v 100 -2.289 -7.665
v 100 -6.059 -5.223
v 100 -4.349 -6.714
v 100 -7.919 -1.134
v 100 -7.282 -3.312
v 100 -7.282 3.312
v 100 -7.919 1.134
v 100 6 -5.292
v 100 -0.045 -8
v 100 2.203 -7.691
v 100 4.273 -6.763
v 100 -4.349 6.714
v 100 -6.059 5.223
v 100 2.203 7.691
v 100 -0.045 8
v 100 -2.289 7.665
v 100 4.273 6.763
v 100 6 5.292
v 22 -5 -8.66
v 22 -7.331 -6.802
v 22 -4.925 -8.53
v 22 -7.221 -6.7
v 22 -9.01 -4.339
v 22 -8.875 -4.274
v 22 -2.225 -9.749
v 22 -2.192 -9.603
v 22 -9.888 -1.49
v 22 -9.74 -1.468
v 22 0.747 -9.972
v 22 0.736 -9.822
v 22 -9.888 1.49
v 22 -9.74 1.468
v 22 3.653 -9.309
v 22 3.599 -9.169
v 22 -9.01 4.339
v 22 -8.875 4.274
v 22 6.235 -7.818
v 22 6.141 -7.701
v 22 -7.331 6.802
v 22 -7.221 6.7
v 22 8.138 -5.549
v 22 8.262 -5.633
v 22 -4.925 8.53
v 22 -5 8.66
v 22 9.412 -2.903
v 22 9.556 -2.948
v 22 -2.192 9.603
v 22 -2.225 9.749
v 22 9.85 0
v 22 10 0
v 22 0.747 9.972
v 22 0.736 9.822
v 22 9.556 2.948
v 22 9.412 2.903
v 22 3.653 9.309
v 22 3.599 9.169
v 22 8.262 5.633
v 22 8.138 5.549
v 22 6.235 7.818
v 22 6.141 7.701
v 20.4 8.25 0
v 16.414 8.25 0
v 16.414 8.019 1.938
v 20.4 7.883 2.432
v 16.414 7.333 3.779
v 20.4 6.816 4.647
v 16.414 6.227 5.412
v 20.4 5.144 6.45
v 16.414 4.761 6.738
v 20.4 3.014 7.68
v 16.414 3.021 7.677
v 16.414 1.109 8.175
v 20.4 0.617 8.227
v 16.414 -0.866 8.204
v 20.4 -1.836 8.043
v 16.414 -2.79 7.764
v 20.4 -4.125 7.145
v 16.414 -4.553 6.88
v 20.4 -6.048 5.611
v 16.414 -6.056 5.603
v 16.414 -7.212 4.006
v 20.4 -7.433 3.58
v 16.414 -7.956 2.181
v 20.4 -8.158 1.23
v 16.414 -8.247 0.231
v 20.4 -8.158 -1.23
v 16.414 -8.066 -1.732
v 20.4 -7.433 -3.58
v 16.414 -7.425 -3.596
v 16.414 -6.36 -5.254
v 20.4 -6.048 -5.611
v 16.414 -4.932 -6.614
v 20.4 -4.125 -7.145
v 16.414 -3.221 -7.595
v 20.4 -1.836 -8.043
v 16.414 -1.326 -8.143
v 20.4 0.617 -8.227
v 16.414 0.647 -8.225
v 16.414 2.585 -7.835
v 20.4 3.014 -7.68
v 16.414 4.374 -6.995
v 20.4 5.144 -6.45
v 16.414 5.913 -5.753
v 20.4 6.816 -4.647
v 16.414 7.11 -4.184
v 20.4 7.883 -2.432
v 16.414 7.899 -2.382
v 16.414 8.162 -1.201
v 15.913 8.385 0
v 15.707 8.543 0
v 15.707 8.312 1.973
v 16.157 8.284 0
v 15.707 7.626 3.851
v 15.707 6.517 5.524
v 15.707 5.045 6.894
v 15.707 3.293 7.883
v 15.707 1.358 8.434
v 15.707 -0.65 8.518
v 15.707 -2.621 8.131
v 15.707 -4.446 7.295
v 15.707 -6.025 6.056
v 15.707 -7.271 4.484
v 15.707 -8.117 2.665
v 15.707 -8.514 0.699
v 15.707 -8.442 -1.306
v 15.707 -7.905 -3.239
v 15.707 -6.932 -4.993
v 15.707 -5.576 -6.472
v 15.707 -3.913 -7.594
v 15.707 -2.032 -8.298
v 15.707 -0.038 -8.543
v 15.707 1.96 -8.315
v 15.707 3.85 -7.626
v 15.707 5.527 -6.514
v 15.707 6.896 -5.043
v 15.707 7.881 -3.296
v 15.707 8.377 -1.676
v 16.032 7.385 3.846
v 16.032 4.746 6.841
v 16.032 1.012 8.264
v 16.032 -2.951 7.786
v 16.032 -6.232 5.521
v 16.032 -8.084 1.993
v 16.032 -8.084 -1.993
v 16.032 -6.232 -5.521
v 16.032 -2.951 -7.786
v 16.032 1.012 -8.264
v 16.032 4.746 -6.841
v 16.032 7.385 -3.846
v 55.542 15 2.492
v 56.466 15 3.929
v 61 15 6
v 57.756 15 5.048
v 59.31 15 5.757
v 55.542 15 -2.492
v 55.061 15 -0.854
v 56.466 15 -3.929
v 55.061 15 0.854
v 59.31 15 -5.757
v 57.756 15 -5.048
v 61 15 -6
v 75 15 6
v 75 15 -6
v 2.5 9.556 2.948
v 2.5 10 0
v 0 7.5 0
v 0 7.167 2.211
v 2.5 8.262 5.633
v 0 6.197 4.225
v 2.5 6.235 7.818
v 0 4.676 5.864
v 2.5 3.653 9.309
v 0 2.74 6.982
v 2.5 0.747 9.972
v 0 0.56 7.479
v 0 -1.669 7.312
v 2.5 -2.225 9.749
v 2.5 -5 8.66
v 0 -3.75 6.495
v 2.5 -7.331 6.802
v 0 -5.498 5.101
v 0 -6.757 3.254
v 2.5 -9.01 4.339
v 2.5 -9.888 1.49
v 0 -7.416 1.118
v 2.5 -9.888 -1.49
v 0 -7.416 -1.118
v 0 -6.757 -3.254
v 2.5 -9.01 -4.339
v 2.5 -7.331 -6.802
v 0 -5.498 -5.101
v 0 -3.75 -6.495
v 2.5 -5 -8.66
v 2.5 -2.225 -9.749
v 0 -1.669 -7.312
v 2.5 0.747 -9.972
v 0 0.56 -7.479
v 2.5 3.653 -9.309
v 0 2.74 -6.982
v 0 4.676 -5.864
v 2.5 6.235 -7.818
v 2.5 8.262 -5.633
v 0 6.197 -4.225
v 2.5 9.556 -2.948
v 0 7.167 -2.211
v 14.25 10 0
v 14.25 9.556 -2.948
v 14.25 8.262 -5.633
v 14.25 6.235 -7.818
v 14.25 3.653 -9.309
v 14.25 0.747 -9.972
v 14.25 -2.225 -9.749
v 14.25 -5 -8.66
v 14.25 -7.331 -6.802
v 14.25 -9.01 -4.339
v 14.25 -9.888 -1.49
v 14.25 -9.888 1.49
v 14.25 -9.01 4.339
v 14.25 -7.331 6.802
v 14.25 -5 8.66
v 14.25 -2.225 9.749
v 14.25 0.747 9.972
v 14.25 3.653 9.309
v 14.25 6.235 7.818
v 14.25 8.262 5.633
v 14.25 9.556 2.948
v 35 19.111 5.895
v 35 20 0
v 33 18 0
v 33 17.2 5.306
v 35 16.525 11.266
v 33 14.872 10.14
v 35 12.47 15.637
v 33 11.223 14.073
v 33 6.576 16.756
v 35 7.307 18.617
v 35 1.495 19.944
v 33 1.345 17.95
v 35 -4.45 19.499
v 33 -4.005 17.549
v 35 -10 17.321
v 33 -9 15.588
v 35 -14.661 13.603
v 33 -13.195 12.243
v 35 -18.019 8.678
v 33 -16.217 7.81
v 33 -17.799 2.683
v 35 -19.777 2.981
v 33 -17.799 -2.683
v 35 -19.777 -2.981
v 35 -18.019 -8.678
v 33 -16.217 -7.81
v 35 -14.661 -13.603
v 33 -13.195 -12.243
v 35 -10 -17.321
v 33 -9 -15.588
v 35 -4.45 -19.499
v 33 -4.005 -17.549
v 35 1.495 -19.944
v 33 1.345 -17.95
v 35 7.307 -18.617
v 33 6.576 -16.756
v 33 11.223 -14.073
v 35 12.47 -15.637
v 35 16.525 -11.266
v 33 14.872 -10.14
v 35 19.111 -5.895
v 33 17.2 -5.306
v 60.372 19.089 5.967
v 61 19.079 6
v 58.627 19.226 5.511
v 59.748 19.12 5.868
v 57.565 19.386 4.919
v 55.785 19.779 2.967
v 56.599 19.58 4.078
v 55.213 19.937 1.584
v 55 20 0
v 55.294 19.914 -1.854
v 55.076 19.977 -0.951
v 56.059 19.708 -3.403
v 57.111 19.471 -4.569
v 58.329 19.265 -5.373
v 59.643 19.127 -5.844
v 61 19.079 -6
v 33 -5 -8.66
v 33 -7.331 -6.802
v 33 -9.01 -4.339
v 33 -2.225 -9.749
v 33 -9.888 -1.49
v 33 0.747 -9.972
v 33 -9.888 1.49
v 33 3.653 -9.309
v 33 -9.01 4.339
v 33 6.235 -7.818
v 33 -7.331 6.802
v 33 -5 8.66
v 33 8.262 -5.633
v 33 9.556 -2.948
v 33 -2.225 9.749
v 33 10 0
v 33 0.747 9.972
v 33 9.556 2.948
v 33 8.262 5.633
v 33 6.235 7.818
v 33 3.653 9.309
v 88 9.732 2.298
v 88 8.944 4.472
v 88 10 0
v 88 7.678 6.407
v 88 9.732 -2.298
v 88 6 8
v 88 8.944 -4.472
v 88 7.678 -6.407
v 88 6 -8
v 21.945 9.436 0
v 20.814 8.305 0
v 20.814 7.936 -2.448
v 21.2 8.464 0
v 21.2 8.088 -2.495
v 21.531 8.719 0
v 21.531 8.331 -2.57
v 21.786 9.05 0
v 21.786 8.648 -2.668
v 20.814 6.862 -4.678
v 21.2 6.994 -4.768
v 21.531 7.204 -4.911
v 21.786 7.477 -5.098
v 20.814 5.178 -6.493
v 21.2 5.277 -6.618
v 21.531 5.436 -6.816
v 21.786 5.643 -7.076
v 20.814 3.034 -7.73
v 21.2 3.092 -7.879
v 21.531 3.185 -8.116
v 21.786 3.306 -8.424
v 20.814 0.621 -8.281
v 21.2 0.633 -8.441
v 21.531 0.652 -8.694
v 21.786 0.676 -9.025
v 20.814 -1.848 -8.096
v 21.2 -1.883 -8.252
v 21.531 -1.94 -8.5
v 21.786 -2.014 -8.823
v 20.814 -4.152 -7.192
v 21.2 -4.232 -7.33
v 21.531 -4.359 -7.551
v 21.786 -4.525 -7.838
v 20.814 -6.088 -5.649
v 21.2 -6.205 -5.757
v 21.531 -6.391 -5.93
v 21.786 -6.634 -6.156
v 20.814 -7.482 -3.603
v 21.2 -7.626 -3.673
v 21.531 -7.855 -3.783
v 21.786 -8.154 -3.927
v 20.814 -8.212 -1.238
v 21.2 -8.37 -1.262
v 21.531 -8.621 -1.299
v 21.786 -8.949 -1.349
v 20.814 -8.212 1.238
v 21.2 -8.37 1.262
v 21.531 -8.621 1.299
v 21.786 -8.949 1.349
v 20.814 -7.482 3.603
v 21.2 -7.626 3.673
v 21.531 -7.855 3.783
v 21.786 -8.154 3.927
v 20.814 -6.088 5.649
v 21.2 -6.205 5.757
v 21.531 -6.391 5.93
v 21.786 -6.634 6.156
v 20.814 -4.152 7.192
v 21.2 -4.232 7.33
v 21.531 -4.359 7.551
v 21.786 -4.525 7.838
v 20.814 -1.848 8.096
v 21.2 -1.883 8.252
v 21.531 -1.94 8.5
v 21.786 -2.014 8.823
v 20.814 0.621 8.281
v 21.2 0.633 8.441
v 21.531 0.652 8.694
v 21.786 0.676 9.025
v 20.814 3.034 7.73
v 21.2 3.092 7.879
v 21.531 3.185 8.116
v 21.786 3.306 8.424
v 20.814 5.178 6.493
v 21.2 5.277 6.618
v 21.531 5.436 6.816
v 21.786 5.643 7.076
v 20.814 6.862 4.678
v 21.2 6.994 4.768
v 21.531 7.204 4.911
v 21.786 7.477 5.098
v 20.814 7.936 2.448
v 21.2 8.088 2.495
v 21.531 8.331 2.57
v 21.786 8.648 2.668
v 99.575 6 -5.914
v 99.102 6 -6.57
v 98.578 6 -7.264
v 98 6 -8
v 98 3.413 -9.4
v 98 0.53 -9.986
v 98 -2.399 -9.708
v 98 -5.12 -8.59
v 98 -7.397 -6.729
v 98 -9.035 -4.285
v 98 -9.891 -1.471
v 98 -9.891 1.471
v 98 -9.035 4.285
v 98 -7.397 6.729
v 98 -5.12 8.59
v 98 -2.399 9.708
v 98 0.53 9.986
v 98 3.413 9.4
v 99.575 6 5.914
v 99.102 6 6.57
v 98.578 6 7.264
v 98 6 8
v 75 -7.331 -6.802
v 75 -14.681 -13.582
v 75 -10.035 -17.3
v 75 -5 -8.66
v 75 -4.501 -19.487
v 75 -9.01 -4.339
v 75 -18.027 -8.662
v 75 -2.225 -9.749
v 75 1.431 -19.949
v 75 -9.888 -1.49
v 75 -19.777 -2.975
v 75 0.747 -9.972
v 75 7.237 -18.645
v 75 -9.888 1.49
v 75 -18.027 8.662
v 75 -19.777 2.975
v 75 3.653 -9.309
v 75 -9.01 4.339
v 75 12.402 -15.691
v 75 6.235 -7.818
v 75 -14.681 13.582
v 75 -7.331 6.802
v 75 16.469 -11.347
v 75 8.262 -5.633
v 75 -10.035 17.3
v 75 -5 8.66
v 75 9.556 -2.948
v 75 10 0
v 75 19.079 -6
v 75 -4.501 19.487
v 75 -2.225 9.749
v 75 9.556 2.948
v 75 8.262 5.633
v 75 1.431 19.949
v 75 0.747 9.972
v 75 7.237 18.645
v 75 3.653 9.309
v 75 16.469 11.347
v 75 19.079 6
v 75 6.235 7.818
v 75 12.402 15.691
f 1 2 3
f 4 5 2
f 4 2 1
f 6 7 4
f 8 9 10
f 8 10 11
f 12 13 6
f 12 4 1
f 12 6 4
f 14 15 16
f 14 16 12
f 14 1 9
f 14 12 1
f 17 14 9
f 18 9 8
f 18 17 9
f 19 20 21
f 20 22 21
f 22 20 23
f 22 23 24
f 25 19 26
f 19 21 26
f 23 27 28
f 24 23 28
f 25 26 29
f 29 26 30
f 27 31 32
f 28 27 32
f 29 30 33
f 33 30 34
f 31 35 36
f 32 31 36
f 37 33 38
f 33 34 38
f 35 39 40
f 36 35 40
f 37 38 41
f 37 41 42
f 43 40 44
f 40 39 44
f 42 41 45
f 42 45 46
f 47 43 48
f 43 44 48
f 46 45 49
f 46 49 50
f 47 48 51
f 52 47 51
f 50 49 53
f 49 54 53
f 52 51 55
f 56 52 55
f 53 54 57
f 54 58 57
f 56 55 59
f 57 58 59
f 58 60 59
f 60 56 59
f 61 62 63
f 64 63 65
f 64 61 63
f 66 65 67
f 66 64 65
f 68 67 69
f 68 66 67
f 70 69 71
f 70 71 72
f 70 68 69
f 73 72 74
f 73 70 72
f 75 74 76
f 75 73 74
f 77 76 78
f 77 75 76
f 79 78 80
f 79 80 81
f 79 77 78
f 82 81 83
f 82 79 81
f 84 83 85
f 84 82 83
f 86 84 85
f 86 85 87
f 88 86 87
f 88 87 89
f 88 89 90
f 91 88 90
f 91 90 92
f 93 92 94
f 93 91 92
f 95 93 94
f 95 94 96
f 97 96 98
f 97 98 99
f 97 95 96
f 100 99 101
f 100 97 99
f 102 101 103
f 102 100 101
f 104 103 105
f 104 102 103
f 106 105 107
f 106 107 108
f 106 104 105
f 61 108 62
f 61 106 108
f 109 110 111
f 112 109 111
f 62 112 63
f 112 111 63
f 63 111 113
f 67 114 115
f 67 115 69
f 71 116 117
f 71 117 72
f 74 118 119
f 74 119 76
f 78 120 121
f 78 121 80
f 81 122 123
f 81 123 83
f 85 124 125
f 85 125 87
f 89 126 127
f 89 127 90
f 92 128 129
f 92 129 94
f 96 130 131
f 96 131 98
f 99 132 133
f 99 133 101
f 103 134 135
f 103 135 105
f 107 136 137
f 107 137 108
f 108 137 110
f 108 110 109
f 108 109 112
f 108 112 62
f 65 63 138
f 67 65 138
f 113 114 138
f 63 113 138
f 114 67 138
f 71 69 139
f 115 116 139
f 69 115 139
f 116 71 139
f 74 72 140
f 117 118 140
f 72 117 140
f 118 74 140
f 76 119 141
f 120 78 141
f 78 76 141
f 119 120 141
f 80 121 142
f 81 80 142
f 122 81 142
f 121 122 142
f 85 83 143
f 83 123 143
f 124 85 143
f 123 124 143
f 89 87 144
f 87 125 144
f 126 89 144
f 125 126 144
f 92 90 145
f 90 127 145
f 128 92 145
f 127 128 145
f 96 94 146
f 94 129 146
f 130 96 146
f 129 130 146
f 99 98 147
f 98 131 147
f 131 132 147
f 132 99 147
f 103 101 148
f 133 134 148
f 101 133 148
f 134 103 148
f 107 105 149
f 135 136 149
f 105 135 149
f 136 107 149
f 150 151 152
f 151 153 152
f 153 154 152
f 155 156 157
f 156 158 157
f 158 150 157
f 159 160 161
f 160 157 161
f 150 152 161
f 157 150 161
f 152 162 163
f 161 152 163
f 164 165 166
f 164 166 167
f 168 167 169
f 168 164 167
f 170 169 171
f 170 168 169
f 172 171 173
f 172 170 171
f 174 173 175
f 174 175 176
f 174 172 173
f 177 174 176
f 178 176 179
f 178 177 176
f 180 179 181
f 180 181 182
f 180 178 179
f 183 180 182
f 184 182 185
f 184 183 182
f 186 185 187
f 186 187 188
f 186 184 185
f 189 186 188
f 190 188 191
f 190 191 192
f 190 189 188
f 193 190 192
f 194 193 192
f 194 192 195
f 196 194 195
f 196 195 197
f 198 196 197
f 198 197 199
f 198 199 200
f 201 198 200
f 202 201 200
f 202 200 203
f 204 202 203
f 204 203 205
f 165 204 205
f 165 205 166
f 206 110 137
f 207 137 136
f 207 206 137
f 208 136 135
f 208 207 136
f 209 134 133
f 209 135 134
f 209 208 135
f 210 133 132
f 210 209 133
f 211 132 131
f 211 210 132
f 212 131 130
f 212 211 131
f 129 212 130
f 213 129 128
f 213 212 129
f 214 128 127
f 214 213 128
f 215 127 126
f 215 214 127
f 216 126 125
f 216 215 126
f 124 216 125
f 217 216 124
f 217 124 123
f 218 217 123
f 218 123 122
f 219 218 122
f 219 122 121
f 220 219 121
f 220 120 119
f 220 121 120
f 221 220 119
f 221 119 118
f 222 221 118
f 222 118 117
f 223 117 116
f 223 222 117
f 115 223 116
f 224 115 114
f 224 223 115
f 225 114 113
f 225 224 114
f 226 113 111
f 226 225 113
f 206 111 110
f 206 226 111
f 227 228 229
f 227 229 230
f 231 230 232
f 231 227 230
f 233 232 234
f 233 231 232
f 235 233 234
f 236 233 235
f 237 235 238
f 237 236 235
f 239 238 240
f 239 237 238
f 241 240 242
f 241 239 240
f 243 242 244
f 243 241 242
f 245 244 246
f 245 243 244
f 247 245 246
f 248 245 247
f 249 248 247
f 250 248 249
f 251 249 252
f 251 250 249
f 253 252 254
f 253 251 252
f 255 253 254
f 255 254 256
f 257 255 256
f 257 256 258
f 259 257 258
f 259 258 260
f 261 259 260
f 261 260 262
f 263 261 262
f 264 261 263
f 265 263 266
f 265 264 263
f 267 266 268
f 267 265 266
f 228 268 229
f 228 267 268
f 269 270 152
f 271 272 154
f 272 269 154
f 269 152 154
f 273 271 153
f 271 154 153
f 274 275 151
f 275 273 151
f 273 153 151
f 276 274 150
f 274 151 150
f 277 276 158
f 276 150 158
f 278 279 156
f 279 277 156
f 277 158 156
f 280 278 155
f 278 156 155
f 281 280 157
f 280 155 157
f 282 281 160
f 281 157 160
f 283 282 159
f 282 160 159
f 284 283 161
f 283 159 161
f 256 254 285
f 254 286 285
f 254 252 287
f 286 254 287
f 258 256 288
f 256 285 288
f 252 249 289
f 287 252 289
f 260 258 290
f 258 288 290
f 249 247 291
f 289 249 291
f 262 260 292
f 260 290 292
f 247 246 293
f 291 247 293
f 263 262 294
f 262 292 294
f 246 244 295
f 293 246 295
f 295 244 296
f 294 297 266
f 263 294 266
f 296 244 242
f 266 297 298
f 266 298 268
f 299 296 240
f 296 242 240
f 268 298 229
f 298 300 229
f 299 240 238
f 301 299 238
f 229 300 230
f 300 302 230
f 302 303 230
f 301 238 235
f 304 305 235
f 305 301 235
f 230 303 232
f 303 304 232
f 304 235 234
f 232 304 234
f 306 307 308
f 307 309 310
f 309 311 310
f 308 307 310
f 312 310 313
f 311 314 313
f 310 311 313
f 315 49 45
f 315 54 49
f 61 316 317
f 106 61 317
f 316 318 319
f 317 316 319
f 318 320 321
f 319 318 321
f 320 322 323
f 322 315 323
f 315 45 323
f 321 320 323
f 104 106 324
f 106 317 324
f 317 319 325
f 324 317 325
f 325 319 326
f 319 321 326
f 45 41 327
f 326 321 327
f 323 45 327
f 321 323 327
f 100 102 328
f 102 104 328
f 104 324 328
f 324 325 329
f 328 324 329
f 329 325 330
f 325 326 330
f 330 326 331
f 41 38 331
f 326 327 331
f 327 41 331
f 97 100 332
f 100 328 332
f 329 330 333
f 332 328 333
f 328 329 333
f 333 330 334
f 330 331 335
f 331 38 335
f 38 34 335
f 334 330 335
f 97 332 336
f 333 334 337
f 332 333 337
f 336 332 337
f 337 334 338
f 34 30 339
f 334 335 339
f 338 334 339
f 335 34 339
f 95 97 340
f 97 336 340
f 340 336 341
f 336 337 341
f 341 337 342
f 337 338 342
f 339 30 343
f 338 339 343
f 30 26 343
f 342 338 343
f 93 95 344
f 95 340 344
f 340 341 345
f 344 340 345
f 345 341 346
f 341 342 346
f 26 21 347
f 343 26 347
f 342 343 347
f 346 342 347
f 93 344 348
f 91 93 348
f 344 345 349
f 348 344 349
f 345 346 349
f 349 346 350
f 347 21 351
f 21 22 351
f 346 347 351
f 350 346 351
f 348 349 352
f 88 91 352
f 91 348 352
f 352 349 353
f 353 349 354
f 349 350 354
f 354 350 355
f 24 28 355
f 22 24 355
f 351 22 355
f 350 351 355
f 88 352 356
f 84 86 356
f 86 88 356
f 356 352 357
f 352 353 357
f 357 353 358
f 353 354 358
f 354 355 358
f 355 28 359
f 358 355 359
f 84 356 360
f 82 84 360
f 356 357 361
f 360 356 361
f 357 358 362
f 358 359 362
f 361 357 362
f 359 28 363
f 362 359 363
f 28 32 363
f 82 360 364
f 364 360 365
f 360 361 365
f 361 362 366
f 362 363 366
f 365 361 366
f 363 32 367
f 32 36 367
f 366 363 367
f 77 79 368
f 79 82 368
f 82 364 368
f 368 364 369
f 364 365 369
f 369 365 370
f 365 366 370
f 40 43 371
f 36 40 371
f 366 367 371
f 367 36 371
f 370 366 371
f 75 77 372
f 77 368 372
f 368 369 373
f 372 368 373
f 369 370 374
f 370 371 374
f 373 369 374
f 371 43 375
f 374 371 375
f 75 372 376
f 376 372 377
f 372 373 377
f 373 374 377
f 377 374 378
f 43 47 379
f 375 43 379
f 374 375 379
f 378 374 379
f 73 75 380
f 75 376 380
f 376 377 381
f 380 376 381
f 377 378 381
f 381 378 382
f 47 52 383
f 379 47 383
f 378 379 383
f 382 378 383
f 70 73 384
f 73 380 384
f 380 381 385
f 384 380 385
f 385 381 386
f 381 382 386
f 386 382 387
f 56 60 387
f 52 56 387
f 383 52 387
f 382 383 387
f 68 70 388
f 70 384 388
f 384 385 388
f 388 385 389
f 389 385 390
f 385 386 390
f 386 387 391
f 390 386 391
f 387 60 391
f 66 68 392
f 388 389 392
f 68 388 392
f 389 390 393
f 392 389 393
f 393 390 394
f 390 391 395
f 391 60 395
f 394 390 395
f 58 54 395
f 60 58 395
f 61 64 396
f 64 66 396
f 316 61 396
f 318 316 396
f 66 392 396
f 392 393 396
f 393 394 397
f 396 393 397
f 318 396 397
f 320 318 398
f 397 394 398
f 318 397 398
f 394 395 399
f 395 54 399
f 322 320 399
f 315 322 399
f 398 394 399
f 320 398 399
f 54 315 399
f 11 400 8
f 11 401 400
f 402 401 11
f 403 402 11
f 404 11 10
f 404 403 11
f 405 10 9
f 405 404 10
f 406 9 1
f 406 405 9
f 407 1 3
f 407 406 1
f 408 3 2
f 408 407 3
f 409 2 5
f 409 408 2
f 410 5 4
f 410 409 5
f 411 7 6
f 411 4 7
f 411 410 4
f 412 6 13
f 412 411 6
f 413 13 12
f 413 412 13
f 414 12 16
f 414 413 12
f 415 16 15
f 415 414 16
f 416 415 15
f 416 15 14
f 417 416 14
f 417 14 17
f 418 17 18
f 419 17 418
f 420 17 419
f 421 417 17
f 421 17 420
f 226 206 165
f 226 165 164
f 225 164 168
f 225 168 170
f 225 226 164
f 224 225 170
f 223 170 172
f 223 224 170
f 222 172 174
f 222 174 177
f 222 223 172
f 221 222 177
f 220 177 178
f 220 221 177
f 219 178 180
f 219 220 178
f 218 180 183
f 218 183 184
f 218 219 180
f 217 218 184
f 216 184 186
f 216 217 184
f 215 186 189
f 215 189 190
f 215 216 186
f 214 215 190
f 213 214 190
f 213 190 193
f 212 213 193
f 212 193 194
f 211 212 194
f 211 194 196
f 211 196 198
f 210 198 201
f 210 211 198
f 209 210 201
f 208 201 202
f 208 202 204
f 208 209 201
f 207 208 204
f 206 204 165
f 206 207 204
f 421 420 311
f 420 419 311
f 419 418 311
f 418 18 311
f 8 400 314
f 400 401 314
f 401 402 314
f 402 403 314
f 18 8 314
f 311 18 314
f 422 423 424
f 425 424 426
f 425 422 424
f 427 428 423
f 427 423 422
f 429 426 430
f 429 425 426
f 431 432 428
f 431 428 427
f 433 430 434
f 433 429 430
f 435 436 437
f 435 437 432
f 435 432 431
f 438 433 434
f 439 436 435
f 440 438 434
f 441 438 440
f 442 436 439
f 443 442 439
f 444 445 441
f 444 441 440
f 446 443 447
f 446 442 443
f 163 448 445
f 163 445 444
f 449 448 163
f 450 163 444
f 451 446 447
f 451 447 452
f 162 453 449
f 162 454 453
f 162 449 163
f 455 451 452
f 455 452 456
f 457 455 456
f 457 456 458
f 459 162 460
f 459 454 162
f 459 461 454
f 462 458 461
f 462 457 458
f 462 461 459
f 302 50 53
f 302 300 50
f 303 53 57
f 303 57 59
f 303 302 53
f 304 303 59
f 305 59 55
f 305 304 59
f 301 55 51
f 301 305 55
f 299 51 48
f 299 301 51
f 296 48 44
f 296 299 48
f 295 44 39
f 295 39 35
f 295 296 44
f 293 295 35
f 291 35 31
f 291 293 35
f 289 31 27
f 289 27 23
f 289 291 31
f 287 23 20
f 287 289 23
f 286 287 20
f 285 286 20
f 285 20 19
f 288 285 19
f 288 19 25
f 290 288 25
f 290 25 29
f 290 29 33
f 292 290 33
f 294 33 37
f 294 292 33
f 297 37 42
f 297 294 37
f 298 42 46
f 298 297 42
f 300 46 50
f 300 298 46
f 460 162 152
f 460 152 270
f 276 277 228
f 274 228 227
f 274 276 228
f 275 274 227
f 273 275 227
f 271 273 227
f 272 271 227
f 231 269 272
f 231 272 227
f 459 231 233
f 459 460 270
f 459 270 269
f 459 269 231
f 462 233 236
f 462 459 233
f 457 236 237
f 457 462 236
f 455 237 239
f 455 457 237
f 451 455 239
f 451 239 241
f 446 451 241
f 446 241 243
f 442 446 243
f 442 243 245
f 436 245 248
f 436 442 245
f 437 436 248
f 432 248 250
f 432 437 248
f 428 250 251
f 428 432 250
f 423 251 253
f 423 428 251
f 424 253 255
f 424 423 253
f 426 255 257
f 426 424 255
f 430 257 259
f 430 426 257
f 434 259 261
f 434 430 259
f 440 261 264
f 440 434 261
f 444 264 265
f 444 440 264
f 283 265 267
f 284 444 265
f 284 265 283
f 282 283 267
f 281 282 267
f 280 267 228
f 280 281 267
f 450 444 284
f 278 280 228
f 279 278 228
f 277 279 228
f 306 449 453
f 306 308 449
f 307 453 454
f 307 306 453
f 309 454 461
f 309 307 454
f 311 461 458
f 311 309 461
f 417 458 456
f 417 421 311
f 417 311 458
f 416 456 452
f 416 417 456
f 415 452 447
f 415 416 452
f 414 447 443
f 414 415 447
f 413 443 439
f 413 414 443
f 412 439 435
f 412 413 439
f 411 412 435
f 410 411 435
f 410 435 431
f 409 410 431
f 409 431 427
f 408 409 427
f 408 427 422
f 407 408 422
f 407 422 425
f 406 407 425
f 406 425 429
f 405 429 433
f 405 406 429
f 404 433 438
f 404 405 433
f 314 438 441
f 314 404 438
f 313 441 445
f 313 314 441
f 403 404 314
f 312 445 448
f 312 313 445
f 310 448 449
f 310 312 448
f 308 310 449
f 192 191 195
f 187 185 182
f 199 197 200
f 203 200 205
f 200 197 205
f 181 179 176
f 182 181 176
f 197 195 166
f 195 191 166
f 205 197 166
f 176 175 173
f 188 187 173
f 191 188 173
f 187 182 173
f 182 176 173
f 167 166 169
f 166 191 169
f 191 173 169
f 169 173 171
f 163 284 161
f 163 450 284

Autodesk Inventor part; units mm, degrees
ref_plane "YZ Plane" through (0, 0, 0) normal (1, 0, 0) x (0, 1, 0)
ref_plane "XZ Plane" through (0, 0, 0) normal (0, 1, 0) x (-1, 0, 0)
ref_plane "XY Plane" through (0, 0, 0) normal (0, 0, 1) x (1, 0, 0)
sketch "Эскиз1" plane through (0, 0, 0) normal (0, 0, 1) x (1, 0, 0)
  line L0 (-20, 0) -> (120, 0) projected
  line L1 (0, -4) -> (0, 24) projected
  line L2 (0, 0) -> (0, 10)
  line L3 (0, 10) -> (16, 10)
  line L4 (16, 10) -> (16, 8.25)
  line L5 (16, 8.25) -> (22, 8.25)
  line L6 (22, 8.25) -> (22, 10)
  line L7 (22, 10) -> (33, 10)
  line L8 (33, 10) -> (33, 20)
  line L9 (33, 20) -> (75, 20)
  line L10 (75, 20) -> (75, 10)
  line L11 (75, 10) -> (100, 10)
  line L12 (100, 10) -> (100, 0)
  line L13 (100, 0) -> (0, 0)
  dimension "d0" = 20
  dimension "d1" = 16.5
  dimension "d2" = 20
  dimension "d3" = 6
  dimension "d4" = 22
  dimension "d5" = 100
  dimension "d6" = 25
  dimension "d7" = 42
  dimension "d8" = 40
  dimension "d9" = 20
revolve "Вращение1" add sketch "Эскиз1" angle 360 about axis through (-10, 0, 0) along (1, 0, 0)
thread "Резьба1" size "M20x2.5" class "6g" standard "ANSI Metric M Profile" full length
chamfer "Фаска1" distance 2.5 angle 45 1 edges at (0, -10, 0)
sketch "Эскиз2" plane through (0, 0, 0) normal (0, 0, 1) x (1, 0, 0)
  line L0 (0, 7.5) -> (2.5, 10) projected
  line L1 (2.5, 10) -> (16, 10) projected
  line L2 (16, 10) -> (16, 8.25) projected
  line L3 (16, 8.25) -> (22, 8.25) projected
  line L4 (22, 8.25) -> (22, 10) projected
  line L5 (22, 10) -> (33, 10) projected
  line L6 (33, 10) -> (33, 20) projected
  line L7 (33, 20) -> (75, 20) projected
  line L8 (75, 20) -> (75, 10) projected
  line L9 (75, 10) -> (100, 10) projected
  line L10 (100, 10) -> (100, -10) projected
  line L11 (100, -10) -> (75, -10) projected
  line L12 (75, -10) -> (75, -20) projected
  line L13 (75, -20) -> (33, -20) projected
  line L14 (33, -20) -> (33, -10) projected
  line L15 (33, -10) -> (22, -10) projected
  line L16 (22, -10) -> (22, -8.25) projected
  line L17 (22, -8.25) -> (16, -8.25) projected
  line L18 (16, -8.25) -> (16, -10) projected
  line L19 (16, -10) -> (2.5, -10) projected
  line L20 (2.5, -10) -> (0, -7.5) projected
  line L21 (0, -7.5) -> (0, 7.5) projected
  line L22 (16, 8.25) -> (14.25, 10)
  line L23 (16, 10) -> (14.25, 10)
  line L24 (16, 10) -> (16, 8.25)
  line L25 (-20, 0) -> (120, 0) projected
  point P0 (0, 0)
revolve "Вращение2" cut sketch "Эскиз2" angle 360 about axis through (-10, 0, 0) along (1, 0, 0) contours L1 L2 L22
fillet "Сопряжение1" radius 1 1 edges at (16, -8.25, 0)
fillet "Сопряжение2" radius 1.6 1 edges at (22, -8.25, 0)
chamfer "Фаска2" distance 2 angle 45 1 edges at (33, -20, 0)
chamfer "Фаска3" distance 2 angle 45 1 edges at (100, -10, 0)
sketch "Эскиз3" plane through (0, 0, 0) normal (0, 0, 1) x (1, 0, 0)
  line L0 (0, 7.5) -> (2.5, 10) projected
  line L1 (2.5, 10) -> (14.25, 10) projected
  line L2 (14.25, 10) -> (15.7071, 8.5429) projected
  arc A0 (15.7071, 8.5429) -> (16.4142, 8.25) centre (16.4142, 9.25) ccw projected
  line L3 (16.4142, 8.25) -> (20.4, 8.25) projected
  arc A1 (20.4, 8.25) -> (22, 9.85) centre (20.4, 9.85) ccw projected
  line L4 (22, 9.85) -> (22, 10) projected
  line L5 (22, 10) -> (33, 10) projected
  line L6 (33, 10) -> (33, 18) projected
  line L7 (33, 18) -> (35, 20) projected
  line L8 (35, 20) -> (75, 20) projected
  line L9 (75, 20) -> (75, 10) projected
  line L10 (75, 10) -> (98, 10) projected
  line L11 (98, 10) -> (100, 8) projected
  line L12 (100, 8) -> (100, -8) projected
  line L13 (100, -8) -> (98, -10) projected
  line L14 (98, -10) -> (75, -10) projected
  line L15 (75, -10) -> (75, -20) projected
  line L16 (75, -20) -> (35, -20) projected
  line L17 (35, -20) -> (33, -18) projected
  line L18 (33, -18) -> (33, -10) projected
  line L19 (33, -10) -> (22, -10) projected
  line L20 (22, -10) -> (22, -9.85) projected
  arc A2 (22, -9.85) -> (20.4, -8.25) centre (20.4, -9.85) ccw projected
  line L21 (20.4, -8.25) -> (16.4142, -8.25) projected
  arc A3 (16.4142, -8.25) -> (15.7071, -8.5429) centre (16.4142, -9.25) ccw projected
  line L22 (15.7071, -8.5429) -> (14.25, -10) projected
  line L23 (14.25, -10) -> (2.5, -10) projected
  line L24 (2.5, -10) -> (0, -7.5) projected
  line L25 (0, -7.5) -> (0, 7.5) projected
  line L26 (100, 6) -> (88, 6)
  line L27 (88, 6) -> (88, 10)
  line L28 (88, 10) -> (88, 15)
  line L29 (88, 15) -> (103, 15)
  line L30 (103, 15) -> (100, 6)
  point P0 (0, 0)
  dimension "d25" = 12
  dimension "d26" = 16
  dimension "d27" = 5
  dimension "d28" = 15
extrude "Выдавливание1" cut sketch "Эскиз3" along normal mid plane 100 contours L28 L29 L30 L12 L11 L10 | L10 L11 L12 L26 L27
sketch "Эскиз4" plane through (75, 0, 0) normal (1, 0, 0) x (0, 0, -1)
  line L0 (-6, 15) -> (6, 15)
  line L1 (0, -28) -> (0, 28) projected
  line L2 (-6, 15) -> (-6, 25)
  line L3 (-6, 25) -> (6, 25)
  line L4 (6, 25) -> (6, 15)
  circle A0 centre (0, 0) radius 10 projected
  circle A1 centre (0, 0) radius 20 projected
  line L5 (0, 20) -> (6, 20) construction
  dimension "d31" = 10
  dimension "d32" = 12
  dimension "d33" = 5
extrude "Выдавливание2" cut sketch "Эскиз4" against normal blind 14 contours L2 A1 L1 L0 | L1 A1 L4 L0 | L2 L3 L1 A1 | L1 L3 L4 A1
sketch "Эскиз5" plane through (75, 15, 6) normal (0, 1, 0) x (1, 0, 0)
  line L0 (-14, 12) -> (-14, 0) projected
  circle A0 centre (-14, 6) radius 6
  point P0 (-75, 6)
extrude "Выдавливание3" cut sketch "Эскиз5" along normal blind 15
properties part number "Вал"
